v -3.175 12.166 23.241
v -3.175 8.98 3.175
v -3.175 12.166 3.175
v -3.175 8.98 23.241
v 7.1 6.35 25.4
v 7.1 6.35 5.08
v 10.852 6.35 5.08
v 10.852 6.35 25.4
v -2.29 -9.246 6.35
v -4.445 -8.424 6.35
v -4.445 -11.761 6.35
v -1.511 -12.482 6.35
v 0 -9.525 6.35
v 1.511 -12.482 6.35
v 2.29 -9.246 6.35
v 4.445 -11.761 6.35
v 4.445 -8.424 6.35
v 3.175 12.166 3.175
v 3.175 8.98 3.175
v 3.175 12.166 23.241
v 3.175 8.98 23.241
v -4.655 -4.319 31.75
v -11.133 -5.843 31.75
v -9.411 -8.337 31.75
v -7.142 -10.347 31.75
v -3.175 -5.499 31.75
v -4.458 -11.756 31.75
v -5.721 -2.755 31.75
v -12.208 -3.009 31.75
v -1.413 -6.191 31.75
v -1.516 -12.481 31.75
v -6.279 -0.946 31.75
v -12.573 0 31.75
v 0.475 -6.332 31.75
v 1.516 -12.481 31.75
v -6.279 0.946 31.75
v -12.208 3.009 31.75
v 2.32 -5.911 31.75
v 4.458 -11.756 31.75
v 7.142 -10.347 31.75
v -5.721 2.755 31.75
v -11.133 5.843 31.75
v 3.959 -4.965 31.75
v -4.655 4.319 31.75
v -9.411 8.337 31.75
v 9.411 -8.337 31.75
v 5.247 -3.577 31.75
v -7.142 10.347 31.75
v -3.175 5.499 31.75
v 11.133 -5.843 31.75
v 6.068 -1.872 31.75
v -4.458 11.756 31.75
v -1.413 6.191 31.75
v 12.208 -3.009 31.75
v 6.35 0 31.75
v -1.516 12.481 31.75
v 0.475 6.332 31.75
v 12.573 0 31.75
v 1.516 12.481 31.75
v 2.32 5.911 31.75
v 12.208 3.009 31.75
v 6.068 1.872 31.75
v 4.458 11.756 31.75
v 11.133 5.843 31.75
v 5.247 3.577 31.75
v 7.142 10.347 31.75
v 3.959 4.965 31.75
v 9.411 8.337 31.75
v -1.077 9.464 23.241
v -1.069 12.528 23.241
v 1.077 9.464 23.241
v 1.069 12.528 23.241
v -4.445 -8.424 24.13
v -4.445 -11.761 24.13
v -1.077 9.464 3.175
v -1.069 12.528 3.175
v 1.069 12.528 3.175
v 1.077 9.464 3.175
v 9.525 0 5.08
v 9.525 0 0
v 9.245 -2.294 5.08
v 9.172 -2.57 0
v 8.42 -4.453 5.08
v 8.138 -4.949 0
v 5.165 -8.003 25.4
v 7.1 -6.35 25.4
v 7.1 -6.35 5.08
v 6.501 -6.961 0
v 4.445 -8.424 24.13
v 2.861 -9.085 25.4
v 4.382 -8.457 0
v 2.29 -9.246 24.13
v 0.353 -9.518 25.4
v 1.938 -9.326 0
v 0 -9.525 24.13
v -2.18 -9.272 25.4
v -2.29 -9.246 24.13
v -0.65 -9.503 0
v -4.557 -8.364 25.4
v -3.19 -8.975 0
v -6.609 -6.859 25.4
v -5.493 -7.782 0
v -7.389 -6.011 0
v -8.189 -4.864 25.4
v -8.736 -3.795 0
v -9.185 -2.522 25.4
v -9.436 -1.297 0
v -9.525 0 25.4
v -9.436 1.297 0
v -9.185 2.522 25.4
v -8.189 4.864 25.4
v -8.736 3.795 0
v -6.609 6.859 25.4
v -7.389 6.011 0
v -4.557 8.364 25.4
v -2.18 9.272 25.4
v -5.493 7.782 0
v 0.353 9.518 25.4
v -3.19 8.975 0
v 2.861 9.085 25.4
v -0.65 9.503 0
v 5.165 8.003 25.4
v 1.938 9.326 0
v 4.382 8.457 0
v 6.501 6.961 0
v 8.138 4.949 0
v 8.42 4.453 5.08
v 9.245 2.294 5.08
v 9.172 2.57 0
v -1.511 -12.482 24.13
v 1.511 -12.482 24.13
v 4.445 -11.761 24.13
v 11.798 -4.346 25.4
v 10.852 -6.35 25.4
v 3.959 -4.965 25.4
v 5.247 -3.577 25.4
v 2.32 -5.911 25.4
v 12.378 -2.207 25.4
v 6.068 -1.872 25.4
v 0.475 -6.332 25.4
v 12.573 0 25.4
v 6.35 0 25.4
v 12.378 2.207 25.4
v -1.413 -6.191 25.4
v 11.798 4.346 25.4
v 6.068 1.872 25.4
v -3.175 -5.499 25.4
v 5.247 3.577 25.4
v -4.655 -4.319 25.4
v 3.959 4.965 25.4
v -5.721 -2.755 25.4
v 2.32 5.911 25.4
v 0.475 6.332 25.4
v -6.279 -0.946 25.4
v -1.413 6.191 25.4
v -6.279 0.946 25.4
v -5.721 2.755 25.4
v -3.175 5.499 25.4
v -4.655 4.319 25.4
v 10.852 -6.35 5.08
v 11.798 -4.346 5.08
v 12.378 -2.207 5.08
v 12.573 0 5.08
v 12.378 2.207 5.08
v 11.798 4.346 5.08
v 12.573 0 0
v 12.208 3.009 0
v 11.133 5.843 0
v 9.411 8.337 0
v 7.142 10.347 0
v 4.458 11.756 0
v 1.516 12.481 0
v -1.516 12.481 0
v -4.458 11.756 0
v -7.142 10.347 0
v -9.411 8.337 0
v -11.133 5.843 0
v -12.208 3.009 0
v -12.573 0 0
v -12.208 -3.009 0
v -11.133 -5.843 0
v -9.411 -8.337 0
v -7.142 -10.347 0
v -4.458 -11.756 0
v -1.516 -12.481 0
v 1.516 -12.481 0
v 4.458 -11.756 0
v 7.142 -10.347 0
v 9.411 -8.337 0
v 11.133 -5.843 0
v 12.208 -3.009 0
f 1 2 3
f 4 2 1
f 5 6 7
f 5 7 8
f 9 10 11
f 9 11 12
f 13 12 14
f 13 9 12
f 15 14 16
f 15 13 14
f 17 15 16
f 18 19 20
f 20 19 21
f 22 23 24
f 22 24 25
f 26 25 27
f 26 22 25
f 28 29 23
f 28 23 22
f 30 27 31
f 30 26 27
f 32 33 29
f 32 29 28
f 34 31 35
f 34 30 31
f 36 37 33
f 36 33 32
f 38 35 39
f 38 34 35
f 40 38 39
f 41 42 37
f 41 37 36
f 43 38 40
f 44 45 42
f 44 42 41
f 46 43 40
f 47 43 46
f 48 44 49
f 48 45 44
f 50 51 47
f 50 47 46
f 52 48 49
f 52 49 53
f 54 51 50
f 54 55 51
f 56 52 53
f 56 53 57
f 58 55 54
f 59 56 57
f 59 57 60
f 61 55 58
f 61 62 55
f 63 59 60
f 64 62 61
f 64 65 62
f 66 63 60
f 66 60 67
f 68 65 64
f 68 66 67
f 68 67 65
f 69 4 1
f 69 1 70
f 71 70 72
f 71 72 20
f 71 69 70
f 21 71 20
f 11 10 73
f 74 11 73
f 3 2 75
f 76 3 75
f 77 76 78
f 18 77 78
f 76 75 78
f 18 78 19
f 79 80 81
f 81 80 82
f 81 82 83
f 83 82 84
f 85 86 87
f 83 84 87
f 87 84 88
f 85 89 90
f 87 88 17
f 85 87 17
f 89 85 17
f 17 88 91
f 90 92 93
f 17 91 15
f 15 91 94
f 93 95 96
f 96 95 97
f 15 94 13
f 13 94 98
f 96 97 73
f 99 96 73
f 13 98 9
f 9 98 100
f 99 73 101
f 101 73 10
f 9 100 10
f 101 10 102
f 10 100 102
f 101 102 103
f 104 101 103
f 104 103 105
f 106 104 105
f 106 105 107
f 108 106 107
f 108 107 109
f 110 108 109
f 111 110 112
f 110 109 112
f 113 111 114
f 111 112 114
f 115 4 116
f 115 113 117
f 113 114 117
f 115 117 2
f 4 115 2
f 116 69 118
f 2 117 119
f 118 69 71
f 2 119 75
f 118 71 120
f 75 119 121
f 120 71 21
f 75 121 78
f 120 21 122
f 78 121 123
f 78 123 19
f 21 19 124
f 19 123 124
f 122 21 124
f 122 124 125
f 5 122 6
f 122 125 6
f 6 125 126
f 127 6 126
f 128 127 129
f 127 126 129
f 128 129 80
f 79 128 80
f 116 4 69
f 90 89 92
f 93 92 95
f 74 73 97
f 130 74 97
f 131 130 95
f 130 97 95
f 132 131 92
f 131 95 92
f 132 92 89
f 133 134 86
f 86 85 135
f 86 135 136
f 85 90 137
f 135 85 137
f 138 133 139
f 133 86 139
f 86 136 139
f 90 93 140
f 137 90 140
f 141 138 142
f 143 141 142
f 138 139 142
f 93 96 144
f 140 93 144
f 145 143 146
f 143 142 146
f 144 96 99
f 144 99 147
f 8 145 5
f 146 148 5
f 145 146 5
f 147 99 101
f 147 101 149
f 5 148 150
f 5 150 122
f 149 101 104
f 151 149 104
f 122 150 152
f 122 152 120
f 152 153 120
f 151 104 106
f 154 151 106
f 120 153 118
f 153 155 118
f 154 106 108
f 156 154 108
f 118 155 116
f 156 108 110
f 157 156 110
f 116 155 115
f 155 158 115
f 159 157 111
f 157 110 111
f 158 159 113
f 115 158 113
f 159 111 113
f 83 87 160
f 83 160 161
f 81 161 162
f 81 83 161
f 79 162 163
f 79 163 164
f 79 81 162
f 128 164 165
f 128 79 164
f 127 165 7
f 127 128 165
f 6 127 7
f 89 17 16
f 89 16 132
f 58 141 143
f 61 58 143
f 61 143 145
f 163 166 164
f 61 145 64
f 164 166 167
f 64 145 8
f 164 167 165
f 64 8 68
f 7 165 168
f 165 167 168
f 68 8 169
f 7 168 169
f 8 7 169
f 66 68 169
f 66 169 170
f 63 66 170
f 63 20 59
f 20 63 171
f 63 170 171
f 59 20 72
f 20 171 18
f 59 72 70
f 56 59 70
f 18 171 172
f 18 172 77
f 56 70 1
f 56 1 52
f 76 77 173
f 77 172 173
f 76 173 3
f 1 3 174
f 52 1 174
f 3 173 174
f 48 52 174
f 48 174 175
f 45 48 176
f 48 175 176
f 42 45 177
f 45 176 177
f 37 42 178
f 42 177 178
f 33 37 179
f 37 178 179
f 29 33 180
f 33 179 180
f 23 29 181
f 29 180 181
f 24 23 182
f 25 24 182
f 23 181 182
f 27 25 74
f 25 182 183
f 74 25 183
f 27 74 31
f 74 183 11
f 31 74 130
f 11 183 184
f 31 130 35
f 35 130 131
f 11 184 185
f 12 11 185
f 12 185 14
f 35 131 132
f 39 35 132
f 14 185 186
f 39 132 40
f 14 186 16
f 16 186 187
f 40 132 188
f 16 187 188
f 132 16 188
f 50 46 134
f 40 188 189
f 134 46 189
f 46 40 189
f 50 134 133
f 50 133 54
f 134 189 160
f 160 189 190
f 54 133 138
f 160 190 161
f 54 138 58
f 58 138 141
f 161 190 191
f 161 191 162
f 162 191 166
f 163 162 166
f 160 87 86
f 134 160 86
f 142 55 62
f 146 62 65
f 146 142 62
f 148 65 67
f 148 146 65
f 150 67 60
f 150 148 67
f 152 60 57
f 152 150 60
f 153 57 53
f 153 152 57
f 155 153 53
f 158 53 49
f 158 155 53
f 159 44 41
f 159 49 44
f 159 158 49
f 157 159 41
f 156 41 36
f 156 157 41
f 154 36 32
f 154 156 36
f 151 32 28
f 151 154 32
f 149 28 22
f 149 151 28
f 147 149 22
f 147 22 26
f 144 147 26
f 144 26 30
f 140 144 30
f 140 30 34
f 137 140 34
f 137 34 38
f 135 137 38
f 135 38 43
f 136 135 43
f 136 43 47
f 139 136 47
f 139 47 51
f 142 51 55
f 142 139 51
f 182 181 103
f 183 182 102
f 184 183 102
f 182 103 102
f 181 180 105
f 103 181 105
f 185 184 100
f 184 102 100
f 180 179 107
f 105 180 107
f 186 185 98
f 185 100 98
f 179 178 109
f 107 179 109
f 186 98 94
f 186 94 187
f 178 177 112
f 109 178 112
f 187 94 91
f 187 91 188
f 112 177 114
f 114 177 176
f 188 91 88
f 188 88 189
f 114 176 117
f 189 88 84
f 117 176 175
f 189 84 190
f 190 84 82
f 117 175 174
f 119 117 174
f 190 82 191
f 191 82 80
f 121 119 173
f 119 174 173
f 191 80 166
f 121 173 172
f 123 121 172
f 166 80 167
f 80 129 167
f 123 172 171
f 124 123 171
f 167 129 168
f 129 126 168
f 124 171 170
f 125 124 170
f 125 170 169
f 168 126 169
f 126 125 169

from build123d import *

# Parameters (mm, degrees)
F0_R      = 12.573
F1_DEPTH  = 31.75
F3_W      = 12.7
F3_H      = 20.32
F4_DEPTH  = 6.986
F6_W      = 6.35
F6_H      = 20.066
F7_DEPTH  = 10.161
F8_W      = 8.89
F8_H      = 17.78
F9_DEPTH  = 12.574
F10_R     = 6.35
F11_DEPTH = 31.751
F12_R     = 9.525
F13_DEPTH = 25.4


with BuildPart() as f1:
    # F0 (on Top) → F1 (new body)
    with BuildSketch(Plane.XY):
        Circle(F0_R)
    extrude(amount=F1_DEPTH)

    # F3 (on offset) → F4 (cut, through all)
    with BuildSketch(Plane.YZ.offset(5.588)):
        with Locations((0, 15.24)):
            Rectangle(F3_W, F3_H)
    extrude(amount=F4_DEPTH, mode=Mode.SUBTRACT)

    # F6 (on offset) → F7 (cut, through all)
    with BuildSketch(Plane.XZ.offset(-2.413)):
        with Locations((0, 13.208)):
            Rectangle(F6_W, F6_H)
    extrude(amount=-F7_DEPTH, mode=Mode.SUBTRACT)

    # F8 (on Front) → F9 (cut, through all)
    with BuildSketch(Plane.XZ):
        with Locations((0, 15.24)):
            Rectangle(F8_W, F8_H)
    extrude(amount=F9_DEPTH, mode=Mode.SUBTRACT)

    # F10 (on Top) → F11 (cut, through all)
    with BuildSketch(Plane.XY):
        Circle(F10_R)
    extrude(amount=F11_DEPTH, mode=Mode.SUBTRACT)

    # F12 (on face) → F13 (cut)
    with BuildSketch(Plane(origin=(0, 0, 0), x_dir=(1, 0, 0), z_dir=(0, 0, -1))):
        Circle(F12_R)
    extrude(amount=-F13_DEPTH, mode=Mode.SUBTRACT)


solid = f1.part
